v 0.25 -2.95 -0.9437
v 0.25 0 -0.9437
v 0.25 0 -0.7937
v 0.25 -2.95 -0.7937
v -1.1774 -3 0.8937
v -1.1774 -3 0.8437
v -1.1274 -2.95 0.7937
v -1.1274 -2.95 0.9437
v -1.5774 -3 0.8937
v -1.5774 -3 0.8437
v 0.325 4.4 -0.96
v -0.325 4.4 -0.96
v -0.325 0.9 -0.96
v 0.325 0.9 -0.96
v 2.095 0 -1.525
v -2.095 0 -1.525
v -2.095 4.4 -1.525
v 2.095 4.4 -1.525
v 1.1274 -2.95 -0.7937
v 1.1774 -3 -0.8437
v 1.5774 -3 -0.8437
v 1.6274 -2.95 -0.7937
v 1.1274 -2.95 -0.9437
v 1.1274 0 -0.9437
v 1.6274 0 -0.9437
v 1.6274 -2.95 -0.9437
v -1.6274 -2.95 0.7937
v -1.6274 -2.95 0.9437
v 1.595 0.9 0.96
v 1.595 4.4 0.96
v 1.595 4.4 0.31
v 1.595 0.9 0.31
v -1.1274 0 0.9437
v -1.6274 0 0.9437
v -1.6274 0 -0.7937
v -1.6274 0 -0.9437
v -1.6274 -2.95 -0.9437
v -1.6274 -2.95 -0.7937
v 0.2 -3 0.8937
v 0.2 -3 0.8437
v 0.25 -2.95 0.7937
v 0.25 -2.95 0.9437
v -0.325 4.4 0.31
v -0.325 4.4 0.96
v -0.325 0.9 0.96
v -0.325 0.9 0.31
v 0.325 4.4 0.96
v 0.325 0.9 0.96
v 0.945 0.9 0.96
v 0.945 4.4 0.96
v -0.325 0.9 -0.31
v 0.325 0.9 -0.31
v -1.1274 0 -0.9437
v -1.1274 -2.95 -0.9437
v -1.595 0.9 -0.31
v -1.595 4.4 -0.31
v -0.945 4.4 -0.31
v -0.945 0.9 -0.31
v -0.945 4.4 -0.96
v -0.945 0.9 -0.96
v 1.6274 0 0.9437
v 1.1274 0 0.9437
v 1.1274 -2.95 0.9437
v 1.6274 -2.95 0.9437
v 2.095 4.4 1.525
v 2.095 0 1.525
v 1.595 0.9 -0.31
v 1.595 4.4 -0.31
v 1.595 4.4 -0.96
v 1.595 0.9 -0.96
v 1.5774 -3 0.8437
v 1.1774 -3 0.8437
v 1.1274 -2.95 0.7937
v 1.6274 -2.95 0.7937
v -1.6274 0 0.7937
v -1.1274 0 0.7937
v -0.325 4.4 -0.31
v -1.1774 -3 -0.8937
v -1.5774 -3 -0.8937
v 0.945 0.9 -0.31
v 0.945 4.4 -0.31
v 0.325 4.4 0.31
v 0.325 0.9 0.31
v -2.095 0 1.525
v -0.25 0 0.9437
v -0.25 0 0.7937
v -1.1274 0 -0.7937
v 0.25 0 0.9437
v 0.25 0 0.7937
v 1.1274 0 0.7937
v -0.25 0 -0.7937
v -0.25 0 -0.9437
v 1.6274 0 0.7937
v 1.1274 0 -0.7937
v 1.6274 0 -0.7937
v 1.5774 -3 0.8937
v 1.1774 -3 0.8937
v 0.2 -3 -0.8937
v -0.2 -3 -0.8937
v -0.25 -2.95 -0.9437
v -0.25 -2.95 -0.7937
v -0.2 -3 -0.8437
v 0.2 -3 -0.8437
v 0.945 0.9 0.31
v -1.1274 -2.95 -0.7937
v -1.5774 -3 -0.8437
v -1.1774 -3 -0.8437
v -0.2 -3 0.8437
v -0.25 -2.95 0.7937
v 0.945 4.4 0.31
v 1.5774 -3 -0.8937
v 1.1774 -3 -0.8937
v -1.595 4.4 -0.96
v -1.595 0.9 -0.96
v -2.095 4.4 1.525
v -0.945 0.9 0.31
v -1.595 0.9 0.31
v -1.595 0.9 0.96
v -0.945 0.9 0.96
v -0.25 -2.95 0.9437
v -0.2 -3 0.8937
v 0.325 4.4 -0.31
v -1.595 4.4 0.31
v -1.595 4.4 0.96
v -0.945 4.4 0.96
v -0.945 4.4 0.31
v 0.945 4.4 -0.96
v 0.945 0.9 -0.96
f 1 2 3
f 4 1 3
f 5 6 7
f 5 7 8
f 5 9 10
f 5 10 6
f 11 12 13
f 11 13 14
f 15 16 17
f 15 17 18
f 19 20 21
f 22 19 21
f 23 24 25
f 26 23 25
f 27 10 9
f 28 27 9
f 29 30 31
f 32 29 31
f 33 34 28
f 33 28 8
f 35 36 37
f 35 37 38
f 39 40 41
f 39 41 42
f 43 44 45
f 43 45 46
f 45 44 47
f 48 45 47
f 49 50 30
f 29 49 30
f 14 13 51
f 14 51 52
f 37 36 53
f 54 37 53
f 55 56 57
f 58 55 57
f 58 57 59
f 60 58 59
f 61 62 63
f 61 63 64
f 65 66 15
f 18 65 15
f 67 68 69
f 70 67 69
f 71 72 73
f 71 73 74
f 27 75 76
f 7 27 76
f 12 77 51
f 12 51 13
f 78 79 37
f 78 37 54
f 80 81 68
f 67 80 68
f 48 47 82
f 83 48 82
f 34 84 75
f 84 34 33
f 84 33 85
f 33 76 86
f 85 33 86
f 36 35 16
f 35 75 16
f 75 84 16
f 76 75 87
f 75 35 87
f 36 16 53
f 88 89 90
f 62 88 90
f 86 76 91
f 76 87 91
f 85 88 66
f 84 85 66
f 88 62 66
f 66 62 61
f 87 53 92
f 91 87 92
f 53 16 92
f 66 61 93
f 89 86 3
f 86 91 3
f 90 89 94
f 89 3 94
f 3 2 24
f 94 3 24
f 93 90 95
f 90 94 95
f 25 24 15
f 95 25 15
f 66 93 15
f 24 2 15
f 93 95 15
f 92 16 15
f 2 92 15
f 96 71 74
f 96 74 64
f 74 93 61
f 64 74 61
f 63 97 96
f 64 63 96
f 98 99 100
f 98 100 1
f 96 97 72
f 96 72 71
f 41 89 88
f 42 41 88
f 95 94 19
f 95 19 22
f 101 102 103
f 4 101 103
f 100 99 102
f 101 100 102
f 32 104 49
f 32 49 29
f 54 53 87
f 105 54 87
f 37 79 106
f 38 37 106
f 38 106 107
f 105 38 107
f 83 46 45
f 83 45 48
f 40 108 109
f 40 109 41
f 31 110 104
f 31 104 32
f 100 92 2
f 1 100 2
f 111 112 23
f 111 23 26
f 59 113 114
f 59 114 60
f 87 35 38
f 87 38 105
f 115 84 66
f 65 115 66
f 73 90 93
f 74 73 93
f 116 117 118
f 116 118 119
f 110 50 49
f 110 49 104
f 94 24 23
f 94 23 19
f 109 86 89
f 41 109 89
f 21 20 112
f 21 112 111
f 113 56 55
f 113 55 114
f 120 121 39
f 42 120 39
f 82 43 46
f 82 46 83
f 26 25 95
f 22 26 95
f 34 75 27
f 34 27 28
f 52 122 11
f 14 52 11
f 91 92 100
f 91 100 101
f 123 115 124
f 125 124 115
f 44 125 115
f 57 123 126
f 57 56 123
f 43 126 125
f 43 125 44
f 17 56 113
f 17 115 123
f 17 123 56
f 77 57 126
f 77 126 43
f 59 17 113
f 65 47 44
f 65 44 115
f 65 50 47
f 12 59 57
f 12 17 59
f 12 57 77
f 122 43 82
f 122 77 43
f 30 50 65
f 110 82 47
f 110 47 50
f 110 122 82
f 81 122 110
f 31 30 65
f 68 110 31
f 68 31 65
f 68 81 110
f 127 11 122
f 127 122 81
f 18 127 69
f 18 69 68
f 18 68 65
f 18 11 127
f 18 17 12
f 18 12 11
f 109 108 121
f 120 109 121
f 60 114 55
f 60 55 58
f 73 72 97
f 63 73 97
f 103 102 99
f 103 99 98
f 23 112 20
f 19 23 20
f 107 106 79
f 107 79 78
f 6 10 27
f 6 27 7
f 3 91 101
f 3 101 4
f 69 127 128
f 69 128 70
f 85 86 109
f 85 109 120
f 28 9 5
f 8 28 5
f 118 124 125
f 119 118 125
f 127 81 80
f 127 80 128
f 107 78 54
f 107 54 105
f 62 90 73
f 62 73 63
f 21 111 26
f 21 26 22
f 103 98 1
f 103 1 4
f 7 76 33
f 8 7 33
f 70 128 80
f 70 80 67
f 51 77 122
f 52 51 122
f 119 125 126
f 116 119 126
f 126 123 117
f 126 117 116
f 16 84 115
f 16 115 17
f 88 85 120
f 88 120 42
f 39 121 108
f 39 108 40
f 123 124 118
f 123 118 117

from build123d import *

# Parameters (mm, degrees)
ESQUISSE2_W             = 4.19
ESQUISSE2_H             = 3.05
BOSS_EXTRU_1_DEPTH      = 4.4
ESQUISSE4_W             = 0.65
ESQUISSE4_H             = 0.65
ENL_V_MAT_EXTRU_1_DEPTH = 3.5
ESQUISSE5_W             = 0.5
ESQUISSE5_H             = 0.15
BOSS_EXTRU_2_DEPTH      = 3
CHANFREIN1_SIZE         = 0.05


with BuildPart() as part:
    # Esquisse2 → Boss.-Extru.1 (new body)
    with BuildSketch(Plane(origin=(0, 0, 0), x_dir=(1, 0, 0), z_dir=(0, 1, 0))):
        Rectangle(ESQUISSE2_W, ESQUISSE2_H)
    extrude(amount=BOSS_EXTRU_1_DEPTH)

    # Esquisse4 → Enlèv. mat.-Extru.1 (cut)
    with BuildSketch(Plane(origin=(0, 4.4, 0), x_dir=(1, 0, 0), z_dir=(0, 1, 0))):
        with Locations((-1.27, 0.635)):
            Rectangle(ESQUISSE4_W, ESQUISSE4_H)
        with Locations((0, 0.635)):
            Rectangle(ESQUISSE4_W, ESQUISSE4_H)
        with Locations((1.27, 0.635)):
            Rectangle(ESQUISSE4_W, ESQUISSE4_H)
        with Locations((-1.27, -0.635)):
            Rectangle(ESQUISSE4_W, ESQUISSE4_H)
        with Locations((0, -0.635)):
            Rectangle(ESQUISSE4_W, ESQUISSE4_H)
        with Locations((1.27, -0.635)):
            Rectangle(ESQUISSE4_W, ESQUISSE4_H)
    extrude(amount=-ENL_V_MAT_EXTRU_1_DEPTH, mode=Mode.SUBTRACT)

    # Esquisse5 → Boss.-Extru.2 (add)
    with BuildSketch(Plane.XZ):
        with Locations((-1.377426973, 0.868741936)):
            Rectangle(ESQUISSE5_W, ESQUISSE5_H)
        with Locations((0, 0.868741936)):
            Rectangle(ESQUISSE5_W, ESQUISSE5_H)
        with Locations((1.377426973, 0.868741936)):
            Rectangle(ESQUISSE5_W, ESQUISSE5_H)
        with Locations((-1.377426973, -0.868741936)):
            Rectangle(ESQUISSE5_W, ESQUISSE5_H)
        with Locations((0, -0.868741936)):
            Rectangle(ESQUISSE5_W, ESQUISSE5_H)
        with Locations((1.377426973, -0.868741936)):
            Rectangle(ESQUISSE5_W, ESQUISSE5_H)
    extrude(amount=BOSS_EXTRU_2_DEPTH)

    # Chanfrein1
    chanfrein1_edges = [part.edges().sort_by_distance(p)[0] for p in [
        (0.25, -3, 0.868741936),
        (0, -3, 0.943741936),
        (-0.25, -3, 0.868741936),
        (0, -3, 0.793741936),
        (1.627426973, -3, 0.868741936),
        (1.377426973, -3, 0.943741936),
        (1.127426973, -3, 0.868741936),
        (1.377426973, -3, 0.793741936),
        (-1.127426973, -3, -0.868741936),
        (-1.377426973, -3, -0.793741936),
        (-1.627426973, -3, -0.868741936),
        (-1.377426973, -3, -0.943741936),
        (0.25, -3, -0.868741936),
        (0, -3, -0.793741936),
        (-0.25, -3, -0.868741936),
        (0, -3, -0.943741936),
        (1.627426973, -3, -0.868741936),
        (1.377426973, -3, -0.793741936),
        (1.127426973, -3, -0.868741936),
        (1.377426973, -3, -0.943741936),
        (-1.127426973, -3, 0.868741936),
        (-1.377426973, -3, 0.943741936),
        (-1.627426973, -3, 0.868741936),
        (-1.377426973, -3, 0.793741936),
    ]]
    chamfer(chanfrein1_edges, length=CHANFREIN1_SIZE)


solid = part.part
